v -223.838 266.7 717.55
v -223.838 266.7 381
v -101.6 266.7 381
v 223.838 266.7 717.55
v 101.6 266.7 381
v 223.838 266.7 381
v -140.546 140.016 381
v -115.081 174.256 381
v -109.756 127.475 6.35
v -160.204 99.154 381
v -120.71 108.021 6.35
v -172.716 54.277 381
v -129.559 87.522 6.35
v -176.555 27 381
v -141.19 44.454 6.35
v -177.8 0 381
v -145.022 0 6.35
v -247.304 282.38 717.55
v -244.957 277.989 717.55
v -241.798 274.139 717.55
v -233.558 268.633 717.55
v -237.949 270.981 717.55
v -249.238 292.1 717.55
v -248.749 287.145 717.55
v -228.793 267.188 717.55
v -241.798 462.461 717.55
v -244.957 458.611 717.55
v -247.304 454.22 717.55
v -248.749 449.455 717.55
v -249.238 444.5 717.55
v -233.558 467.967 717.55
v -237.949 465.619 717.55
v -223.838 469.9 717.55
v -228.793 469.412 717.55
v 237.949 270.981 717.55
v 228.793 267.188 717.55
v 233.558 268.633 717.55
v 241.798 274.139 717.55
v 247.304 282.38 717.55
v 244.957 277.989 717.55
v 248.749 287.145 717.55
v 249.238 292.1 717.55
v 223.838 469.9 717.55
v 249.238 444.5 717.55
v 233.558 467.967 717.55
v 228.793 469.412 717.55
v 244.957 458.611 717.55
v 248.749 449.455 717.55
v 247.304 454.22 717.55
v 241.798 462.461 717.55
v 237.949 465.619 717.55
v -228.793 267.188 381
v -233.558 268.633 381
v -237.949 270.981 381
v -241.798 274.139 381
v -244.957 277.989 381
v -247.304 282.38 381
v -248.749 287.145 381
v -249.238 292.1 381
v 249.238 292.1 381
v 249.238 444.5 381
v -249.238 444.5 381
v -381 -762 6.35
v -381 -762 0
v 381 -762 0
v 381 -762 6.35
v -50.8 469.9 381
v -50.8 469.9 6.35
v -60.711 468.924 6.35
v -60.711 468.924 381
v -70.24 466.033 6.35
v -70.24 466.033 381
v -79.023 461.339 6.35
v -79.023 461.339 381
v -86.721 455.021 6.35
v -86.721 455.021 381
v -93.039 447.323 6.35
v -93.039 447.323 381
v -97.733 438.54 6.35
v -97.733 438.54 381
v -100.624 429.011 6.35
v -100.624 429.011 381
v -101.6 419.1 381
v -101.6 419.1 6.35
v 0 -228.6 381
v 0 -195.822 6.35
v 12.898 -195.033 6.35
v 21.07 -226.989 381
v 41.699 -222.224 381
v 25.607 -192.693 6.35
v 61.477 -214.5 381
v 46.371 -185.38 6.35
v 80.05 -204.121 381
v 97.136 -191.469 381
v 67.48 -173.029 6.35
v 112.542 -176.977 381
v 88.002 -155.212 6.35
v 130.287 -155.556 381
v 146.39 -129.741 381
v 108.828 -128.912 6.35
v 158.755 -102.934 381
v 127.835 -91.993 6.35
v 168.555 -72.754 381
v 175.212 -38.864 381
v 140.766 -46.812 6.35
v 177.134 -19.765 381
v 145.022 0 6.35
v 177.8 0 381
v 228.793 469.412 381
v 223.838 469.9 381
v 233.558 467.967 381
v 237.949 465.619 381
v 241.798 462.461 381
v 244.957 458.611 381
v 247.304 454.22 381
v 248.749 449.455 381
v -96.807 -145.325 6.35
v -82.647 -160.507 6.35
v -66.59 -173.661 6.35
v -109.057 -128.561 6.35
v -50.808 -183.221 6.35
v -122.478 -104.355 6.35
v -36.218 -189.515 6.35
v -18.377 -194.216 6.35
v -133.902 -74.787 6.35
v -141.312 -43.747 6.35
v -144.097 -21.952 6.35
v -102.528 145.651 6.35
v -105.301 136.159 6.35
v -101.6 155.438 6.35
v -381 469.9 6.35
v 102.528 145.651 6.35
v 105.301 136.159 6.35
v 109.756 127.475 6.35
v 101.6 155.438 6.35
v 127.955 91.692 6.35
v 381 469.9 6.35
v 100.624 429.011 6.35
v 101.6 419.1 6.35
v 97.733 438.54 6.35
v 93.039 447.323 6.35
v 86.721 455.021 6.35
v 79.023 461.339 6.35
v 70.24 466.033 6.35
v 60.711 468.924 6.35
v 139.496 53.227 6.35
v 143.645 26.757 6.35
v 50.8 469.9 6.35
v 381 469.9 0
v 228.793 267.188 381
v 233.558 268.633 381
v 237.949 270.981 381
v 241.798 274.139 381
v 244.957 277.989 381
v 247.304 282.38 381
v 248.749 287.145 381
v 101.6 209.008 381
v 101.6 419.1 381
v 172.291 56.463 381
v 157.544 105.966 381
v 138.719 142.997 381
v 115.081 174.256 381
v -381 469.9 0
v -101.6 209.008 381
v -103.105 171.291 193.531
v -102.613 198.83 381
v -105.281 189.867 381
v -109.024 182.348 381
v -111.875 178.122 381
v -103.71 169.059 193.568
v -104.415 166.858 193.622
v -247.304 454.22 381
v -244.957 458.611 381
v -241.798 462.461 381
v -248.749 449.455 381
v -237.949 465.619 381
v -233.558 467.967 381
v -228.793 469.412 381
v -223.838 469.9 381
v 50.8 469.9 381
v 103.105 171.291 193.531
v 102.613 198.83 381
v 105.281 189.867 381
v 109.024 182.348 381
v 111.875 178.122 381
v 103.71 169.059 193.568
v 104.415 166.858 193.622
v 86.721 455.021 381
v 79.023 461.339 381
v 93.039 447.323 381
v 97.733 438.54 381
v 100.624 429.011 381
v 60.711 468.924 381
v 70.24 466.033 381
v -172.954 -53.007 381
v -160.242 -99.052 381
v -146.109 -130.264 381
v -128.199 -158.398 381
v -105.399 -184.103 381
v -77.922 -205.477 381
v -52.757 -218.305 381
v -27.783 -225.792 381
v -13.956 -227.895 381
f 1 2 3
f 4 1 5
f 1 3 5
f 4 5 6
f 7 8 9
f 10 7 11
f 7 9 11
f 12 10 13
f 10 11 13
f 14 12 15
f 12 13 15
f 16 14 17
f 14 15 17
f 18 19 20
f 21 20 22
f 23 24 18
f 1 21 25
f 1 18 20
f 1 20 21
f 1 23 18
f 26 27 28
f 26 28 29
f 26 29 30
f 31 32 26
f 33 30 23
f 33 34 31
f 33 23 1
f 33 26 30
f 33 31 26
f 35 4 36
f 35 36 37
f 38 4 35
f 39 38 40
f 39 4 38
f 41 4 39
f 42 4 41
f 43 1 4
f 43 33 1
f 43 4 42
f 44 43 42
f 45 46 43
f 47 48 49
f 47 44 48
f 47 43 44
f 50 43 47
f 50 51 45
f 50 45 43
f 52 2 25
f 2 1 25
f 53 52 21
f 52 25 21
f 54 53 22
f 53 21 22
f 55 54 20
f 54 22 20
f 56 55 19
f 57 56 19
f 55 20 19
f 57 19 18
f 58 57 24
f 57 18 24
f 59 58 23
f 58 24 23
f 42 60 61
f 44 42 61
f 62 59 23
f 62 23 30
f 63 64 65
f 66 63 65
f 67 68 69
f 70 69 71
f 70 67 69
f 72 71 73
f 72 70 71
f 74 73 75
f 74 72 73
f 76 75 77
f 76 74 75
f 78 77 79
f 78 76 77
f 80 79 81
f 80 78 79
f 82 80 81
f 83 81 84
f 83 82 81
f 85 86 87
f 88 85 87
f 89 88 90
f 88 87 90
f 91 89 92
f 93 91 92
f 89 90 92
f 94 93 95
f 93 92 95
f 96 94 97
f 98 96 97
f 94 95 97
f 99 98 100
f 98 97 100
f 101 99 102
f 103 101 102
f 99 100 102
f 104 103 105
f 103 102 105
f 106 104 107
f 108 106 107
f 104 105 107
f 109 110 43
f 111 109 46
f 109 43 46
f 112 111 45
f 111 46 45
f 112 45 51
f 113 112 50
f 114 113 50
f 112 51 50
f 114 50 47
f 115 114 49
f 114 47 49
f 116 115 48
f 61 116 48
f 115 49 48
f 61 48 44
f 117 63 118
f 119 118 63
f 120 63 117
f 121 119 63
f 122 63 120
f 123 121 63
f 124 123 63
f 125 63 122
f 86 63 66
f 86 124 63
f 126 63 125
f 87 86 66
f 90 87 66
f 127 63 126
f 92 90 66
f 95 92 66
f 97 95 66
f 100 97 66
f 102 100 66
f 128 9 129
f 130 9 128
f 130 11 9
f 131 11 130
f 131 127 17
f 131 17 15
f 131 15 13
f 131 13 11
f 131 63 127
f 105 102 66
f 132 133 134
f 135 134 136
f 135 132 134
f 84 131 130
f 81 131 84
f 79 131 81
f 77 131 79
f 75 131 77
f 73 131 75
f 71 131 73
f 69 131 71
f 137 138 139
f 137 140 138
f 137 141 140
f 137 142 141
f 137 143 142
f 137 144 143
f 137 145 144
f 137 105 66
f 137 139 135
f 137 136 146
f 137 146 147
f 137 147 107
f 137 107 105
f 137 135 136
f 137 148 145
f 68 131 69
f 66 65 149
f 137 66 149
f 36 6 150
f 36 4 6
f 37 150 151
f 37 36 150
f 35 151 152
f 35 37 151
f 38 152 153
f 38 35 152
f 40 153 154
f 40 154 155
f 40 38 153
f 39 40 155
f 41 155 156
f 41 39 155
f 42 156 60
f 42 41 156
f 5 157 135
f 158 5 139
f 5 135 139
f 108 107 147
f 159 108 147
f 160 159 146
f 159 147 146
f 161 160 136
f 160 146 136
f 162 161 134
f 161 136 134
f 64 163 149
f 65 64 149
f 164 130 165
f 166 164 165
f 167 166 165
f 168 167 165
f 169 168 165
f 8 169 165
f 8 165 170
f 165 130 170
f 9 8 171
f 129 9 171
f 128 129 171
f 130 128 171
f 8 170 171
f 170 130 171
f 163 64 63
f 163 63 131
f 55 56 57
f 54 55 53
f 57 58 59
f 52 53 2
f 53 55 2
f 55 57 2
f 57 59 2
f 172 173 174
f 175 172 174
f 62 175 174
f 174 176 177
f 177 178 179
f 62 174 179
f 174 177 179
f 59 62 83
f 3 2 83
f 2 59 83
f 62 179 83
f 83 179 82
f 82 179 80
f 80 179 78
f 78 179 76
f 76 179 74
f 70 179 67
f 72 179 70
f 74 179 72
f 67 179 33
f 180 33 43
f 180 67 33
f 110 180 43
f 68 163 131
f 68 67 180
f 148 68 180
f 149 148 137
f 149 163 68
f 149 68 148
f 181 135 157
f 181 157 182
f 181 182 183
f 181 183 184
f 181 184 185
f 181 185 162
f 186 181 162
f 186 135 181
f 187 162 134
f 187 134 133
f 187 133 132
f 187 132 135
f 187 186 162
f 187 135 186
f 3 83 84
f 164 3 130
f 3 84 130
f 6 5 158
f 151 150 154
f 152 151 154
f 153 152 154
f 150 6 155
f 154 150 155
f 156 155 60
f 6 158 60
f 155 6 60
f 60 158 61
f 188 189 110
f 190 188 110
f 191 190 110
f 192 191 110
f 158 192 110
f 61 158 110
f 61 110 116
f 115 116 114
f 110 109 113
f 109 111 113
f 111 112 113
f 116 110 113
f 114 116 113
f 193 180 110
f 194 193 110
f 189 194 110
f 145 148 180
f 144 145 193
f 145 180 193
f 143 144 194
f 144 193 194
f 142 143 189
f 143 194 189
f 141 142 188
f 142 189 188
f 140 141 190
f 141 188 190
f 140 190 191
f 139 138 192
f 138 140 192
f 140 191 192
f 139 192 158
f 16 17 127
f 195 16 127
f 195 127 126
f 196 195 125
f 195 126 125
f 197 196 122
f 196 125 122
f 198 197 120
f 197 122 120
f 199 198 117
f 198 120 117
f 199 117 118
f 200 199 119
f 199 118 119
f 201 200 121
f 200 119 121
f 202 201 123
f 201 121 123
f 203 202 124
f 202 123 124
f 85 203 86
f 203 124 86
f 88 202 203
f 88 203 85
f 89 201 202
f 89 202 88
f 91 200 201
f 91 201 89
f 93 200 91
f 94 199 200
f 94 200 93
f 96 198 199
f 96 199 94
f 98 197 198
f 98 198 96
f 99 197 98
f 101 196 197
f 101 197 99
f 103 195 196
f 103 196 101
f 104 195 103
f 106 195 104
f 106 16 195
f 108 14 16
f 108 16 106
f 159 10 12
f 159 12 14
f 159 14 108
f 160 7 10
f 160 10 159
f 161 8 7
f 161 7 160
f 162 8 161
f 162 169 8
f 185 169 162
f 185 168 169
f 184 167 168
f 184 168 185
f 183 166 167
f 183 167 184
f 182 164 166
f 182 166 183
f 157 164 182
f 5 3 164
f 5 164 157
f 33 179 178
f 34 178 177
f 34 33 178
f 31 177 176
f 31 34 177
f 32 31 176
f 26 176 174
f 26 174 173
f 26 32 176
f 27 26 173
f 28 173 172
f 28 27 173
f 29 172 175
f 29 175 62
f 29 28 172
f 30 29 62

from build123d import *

# Parameters (mm, degrees)
F6_DEPTH  = 381
F6_TAPER  = 5
F7_DEPTH  = 381
F4_W      = 498.475
F4_H      = 203.2
F8_DEPTH  = 336.55
F9_R      = 50.8
F10_R     = 50.8
F11_R     = 25.4
F5_W      = 762
F5_H      = 1231.9
F12_DEPTH = 6.35


with BuildPart() as f6:
    # F2 (on offset) → F6 (new body, through all)
    with BuildSketch(Plane.XY.offset(381)):
        with BuildLine():
            add(Edge.make_bspline(
                [(0, 228.6), (-307.9586335857, 228.6), (-153.9793167929, -114.3), (0, -457.2), (153.9793167929, -114.3), (307.9586335857, 228.6), (0, 228.6)],
                knots=[0, 0, 0, 2.0943951024, 2.0943951024, 4.1887902048, 4.1887902048, 6.2831853072, 6.2831853072, 6.2831853072], degree=2, weights=[1, 0.5, 1, 0.5, 1, 0.5, 1]))
        make_face()
    extrude(amount=-F6_DEPTH, taper=F6_TAPER)

    # F3 (on Top) → F7 (join, through all)
    with BuildSketch(Plane.XY):
        Polygon((-101.6, 469.9), (-101.6, 0), (0, 0), (101.6, 0), (101.6, 469.9), align=None)
    extrude(amount=F7_DEPTH)

    # F4 (on offset) → F8 (join, through all)
    with BuildSketch(Plane.XY.offset(381)):
        with Locations((0, 368.3)):
            Rectangle(F4_W, F4_H)
    extrude(amount=F8_DEPTH)

    # F9
    f9_edges = [f6.edges().sort_by_distance(p)[0] for p in [
        (-101.6, 469.9, 190.5),
        (101.6, 469.9, 190.5),
    ]]
    fillet(f9_edges, radius=F9_R)

    # F10
    f10_edges = [f6.edges().sort_by_distance(p)[0] for p in [
        (101.6, 164.265069, 190.329553),
        (-101.6, 164.265069, 190.329553),
    ]]
    fillet(f10_edges, radius=F10_R)

    # F11
    f11_edges = [f6.edges().sort_by_distance(p)[0] for p in [
        (249.2375, 266.7, 549.275),
        (249.2375, 469.9, 549.275),
        (-249.2375, 266.7, 549.275),
        (-249.2375, 469.9, 549.275),
    ]]
    fillet(f11_edges, radius=F11_R)

    # F5 (on Top) → F12 (join)
    with BuildSketch(Plane.XY):
        with Locations((0, -146.05)):
            Rectangle(F5_W, F5_H)
    extrude(amount=F12_DEPTH)


solid = f6.part
